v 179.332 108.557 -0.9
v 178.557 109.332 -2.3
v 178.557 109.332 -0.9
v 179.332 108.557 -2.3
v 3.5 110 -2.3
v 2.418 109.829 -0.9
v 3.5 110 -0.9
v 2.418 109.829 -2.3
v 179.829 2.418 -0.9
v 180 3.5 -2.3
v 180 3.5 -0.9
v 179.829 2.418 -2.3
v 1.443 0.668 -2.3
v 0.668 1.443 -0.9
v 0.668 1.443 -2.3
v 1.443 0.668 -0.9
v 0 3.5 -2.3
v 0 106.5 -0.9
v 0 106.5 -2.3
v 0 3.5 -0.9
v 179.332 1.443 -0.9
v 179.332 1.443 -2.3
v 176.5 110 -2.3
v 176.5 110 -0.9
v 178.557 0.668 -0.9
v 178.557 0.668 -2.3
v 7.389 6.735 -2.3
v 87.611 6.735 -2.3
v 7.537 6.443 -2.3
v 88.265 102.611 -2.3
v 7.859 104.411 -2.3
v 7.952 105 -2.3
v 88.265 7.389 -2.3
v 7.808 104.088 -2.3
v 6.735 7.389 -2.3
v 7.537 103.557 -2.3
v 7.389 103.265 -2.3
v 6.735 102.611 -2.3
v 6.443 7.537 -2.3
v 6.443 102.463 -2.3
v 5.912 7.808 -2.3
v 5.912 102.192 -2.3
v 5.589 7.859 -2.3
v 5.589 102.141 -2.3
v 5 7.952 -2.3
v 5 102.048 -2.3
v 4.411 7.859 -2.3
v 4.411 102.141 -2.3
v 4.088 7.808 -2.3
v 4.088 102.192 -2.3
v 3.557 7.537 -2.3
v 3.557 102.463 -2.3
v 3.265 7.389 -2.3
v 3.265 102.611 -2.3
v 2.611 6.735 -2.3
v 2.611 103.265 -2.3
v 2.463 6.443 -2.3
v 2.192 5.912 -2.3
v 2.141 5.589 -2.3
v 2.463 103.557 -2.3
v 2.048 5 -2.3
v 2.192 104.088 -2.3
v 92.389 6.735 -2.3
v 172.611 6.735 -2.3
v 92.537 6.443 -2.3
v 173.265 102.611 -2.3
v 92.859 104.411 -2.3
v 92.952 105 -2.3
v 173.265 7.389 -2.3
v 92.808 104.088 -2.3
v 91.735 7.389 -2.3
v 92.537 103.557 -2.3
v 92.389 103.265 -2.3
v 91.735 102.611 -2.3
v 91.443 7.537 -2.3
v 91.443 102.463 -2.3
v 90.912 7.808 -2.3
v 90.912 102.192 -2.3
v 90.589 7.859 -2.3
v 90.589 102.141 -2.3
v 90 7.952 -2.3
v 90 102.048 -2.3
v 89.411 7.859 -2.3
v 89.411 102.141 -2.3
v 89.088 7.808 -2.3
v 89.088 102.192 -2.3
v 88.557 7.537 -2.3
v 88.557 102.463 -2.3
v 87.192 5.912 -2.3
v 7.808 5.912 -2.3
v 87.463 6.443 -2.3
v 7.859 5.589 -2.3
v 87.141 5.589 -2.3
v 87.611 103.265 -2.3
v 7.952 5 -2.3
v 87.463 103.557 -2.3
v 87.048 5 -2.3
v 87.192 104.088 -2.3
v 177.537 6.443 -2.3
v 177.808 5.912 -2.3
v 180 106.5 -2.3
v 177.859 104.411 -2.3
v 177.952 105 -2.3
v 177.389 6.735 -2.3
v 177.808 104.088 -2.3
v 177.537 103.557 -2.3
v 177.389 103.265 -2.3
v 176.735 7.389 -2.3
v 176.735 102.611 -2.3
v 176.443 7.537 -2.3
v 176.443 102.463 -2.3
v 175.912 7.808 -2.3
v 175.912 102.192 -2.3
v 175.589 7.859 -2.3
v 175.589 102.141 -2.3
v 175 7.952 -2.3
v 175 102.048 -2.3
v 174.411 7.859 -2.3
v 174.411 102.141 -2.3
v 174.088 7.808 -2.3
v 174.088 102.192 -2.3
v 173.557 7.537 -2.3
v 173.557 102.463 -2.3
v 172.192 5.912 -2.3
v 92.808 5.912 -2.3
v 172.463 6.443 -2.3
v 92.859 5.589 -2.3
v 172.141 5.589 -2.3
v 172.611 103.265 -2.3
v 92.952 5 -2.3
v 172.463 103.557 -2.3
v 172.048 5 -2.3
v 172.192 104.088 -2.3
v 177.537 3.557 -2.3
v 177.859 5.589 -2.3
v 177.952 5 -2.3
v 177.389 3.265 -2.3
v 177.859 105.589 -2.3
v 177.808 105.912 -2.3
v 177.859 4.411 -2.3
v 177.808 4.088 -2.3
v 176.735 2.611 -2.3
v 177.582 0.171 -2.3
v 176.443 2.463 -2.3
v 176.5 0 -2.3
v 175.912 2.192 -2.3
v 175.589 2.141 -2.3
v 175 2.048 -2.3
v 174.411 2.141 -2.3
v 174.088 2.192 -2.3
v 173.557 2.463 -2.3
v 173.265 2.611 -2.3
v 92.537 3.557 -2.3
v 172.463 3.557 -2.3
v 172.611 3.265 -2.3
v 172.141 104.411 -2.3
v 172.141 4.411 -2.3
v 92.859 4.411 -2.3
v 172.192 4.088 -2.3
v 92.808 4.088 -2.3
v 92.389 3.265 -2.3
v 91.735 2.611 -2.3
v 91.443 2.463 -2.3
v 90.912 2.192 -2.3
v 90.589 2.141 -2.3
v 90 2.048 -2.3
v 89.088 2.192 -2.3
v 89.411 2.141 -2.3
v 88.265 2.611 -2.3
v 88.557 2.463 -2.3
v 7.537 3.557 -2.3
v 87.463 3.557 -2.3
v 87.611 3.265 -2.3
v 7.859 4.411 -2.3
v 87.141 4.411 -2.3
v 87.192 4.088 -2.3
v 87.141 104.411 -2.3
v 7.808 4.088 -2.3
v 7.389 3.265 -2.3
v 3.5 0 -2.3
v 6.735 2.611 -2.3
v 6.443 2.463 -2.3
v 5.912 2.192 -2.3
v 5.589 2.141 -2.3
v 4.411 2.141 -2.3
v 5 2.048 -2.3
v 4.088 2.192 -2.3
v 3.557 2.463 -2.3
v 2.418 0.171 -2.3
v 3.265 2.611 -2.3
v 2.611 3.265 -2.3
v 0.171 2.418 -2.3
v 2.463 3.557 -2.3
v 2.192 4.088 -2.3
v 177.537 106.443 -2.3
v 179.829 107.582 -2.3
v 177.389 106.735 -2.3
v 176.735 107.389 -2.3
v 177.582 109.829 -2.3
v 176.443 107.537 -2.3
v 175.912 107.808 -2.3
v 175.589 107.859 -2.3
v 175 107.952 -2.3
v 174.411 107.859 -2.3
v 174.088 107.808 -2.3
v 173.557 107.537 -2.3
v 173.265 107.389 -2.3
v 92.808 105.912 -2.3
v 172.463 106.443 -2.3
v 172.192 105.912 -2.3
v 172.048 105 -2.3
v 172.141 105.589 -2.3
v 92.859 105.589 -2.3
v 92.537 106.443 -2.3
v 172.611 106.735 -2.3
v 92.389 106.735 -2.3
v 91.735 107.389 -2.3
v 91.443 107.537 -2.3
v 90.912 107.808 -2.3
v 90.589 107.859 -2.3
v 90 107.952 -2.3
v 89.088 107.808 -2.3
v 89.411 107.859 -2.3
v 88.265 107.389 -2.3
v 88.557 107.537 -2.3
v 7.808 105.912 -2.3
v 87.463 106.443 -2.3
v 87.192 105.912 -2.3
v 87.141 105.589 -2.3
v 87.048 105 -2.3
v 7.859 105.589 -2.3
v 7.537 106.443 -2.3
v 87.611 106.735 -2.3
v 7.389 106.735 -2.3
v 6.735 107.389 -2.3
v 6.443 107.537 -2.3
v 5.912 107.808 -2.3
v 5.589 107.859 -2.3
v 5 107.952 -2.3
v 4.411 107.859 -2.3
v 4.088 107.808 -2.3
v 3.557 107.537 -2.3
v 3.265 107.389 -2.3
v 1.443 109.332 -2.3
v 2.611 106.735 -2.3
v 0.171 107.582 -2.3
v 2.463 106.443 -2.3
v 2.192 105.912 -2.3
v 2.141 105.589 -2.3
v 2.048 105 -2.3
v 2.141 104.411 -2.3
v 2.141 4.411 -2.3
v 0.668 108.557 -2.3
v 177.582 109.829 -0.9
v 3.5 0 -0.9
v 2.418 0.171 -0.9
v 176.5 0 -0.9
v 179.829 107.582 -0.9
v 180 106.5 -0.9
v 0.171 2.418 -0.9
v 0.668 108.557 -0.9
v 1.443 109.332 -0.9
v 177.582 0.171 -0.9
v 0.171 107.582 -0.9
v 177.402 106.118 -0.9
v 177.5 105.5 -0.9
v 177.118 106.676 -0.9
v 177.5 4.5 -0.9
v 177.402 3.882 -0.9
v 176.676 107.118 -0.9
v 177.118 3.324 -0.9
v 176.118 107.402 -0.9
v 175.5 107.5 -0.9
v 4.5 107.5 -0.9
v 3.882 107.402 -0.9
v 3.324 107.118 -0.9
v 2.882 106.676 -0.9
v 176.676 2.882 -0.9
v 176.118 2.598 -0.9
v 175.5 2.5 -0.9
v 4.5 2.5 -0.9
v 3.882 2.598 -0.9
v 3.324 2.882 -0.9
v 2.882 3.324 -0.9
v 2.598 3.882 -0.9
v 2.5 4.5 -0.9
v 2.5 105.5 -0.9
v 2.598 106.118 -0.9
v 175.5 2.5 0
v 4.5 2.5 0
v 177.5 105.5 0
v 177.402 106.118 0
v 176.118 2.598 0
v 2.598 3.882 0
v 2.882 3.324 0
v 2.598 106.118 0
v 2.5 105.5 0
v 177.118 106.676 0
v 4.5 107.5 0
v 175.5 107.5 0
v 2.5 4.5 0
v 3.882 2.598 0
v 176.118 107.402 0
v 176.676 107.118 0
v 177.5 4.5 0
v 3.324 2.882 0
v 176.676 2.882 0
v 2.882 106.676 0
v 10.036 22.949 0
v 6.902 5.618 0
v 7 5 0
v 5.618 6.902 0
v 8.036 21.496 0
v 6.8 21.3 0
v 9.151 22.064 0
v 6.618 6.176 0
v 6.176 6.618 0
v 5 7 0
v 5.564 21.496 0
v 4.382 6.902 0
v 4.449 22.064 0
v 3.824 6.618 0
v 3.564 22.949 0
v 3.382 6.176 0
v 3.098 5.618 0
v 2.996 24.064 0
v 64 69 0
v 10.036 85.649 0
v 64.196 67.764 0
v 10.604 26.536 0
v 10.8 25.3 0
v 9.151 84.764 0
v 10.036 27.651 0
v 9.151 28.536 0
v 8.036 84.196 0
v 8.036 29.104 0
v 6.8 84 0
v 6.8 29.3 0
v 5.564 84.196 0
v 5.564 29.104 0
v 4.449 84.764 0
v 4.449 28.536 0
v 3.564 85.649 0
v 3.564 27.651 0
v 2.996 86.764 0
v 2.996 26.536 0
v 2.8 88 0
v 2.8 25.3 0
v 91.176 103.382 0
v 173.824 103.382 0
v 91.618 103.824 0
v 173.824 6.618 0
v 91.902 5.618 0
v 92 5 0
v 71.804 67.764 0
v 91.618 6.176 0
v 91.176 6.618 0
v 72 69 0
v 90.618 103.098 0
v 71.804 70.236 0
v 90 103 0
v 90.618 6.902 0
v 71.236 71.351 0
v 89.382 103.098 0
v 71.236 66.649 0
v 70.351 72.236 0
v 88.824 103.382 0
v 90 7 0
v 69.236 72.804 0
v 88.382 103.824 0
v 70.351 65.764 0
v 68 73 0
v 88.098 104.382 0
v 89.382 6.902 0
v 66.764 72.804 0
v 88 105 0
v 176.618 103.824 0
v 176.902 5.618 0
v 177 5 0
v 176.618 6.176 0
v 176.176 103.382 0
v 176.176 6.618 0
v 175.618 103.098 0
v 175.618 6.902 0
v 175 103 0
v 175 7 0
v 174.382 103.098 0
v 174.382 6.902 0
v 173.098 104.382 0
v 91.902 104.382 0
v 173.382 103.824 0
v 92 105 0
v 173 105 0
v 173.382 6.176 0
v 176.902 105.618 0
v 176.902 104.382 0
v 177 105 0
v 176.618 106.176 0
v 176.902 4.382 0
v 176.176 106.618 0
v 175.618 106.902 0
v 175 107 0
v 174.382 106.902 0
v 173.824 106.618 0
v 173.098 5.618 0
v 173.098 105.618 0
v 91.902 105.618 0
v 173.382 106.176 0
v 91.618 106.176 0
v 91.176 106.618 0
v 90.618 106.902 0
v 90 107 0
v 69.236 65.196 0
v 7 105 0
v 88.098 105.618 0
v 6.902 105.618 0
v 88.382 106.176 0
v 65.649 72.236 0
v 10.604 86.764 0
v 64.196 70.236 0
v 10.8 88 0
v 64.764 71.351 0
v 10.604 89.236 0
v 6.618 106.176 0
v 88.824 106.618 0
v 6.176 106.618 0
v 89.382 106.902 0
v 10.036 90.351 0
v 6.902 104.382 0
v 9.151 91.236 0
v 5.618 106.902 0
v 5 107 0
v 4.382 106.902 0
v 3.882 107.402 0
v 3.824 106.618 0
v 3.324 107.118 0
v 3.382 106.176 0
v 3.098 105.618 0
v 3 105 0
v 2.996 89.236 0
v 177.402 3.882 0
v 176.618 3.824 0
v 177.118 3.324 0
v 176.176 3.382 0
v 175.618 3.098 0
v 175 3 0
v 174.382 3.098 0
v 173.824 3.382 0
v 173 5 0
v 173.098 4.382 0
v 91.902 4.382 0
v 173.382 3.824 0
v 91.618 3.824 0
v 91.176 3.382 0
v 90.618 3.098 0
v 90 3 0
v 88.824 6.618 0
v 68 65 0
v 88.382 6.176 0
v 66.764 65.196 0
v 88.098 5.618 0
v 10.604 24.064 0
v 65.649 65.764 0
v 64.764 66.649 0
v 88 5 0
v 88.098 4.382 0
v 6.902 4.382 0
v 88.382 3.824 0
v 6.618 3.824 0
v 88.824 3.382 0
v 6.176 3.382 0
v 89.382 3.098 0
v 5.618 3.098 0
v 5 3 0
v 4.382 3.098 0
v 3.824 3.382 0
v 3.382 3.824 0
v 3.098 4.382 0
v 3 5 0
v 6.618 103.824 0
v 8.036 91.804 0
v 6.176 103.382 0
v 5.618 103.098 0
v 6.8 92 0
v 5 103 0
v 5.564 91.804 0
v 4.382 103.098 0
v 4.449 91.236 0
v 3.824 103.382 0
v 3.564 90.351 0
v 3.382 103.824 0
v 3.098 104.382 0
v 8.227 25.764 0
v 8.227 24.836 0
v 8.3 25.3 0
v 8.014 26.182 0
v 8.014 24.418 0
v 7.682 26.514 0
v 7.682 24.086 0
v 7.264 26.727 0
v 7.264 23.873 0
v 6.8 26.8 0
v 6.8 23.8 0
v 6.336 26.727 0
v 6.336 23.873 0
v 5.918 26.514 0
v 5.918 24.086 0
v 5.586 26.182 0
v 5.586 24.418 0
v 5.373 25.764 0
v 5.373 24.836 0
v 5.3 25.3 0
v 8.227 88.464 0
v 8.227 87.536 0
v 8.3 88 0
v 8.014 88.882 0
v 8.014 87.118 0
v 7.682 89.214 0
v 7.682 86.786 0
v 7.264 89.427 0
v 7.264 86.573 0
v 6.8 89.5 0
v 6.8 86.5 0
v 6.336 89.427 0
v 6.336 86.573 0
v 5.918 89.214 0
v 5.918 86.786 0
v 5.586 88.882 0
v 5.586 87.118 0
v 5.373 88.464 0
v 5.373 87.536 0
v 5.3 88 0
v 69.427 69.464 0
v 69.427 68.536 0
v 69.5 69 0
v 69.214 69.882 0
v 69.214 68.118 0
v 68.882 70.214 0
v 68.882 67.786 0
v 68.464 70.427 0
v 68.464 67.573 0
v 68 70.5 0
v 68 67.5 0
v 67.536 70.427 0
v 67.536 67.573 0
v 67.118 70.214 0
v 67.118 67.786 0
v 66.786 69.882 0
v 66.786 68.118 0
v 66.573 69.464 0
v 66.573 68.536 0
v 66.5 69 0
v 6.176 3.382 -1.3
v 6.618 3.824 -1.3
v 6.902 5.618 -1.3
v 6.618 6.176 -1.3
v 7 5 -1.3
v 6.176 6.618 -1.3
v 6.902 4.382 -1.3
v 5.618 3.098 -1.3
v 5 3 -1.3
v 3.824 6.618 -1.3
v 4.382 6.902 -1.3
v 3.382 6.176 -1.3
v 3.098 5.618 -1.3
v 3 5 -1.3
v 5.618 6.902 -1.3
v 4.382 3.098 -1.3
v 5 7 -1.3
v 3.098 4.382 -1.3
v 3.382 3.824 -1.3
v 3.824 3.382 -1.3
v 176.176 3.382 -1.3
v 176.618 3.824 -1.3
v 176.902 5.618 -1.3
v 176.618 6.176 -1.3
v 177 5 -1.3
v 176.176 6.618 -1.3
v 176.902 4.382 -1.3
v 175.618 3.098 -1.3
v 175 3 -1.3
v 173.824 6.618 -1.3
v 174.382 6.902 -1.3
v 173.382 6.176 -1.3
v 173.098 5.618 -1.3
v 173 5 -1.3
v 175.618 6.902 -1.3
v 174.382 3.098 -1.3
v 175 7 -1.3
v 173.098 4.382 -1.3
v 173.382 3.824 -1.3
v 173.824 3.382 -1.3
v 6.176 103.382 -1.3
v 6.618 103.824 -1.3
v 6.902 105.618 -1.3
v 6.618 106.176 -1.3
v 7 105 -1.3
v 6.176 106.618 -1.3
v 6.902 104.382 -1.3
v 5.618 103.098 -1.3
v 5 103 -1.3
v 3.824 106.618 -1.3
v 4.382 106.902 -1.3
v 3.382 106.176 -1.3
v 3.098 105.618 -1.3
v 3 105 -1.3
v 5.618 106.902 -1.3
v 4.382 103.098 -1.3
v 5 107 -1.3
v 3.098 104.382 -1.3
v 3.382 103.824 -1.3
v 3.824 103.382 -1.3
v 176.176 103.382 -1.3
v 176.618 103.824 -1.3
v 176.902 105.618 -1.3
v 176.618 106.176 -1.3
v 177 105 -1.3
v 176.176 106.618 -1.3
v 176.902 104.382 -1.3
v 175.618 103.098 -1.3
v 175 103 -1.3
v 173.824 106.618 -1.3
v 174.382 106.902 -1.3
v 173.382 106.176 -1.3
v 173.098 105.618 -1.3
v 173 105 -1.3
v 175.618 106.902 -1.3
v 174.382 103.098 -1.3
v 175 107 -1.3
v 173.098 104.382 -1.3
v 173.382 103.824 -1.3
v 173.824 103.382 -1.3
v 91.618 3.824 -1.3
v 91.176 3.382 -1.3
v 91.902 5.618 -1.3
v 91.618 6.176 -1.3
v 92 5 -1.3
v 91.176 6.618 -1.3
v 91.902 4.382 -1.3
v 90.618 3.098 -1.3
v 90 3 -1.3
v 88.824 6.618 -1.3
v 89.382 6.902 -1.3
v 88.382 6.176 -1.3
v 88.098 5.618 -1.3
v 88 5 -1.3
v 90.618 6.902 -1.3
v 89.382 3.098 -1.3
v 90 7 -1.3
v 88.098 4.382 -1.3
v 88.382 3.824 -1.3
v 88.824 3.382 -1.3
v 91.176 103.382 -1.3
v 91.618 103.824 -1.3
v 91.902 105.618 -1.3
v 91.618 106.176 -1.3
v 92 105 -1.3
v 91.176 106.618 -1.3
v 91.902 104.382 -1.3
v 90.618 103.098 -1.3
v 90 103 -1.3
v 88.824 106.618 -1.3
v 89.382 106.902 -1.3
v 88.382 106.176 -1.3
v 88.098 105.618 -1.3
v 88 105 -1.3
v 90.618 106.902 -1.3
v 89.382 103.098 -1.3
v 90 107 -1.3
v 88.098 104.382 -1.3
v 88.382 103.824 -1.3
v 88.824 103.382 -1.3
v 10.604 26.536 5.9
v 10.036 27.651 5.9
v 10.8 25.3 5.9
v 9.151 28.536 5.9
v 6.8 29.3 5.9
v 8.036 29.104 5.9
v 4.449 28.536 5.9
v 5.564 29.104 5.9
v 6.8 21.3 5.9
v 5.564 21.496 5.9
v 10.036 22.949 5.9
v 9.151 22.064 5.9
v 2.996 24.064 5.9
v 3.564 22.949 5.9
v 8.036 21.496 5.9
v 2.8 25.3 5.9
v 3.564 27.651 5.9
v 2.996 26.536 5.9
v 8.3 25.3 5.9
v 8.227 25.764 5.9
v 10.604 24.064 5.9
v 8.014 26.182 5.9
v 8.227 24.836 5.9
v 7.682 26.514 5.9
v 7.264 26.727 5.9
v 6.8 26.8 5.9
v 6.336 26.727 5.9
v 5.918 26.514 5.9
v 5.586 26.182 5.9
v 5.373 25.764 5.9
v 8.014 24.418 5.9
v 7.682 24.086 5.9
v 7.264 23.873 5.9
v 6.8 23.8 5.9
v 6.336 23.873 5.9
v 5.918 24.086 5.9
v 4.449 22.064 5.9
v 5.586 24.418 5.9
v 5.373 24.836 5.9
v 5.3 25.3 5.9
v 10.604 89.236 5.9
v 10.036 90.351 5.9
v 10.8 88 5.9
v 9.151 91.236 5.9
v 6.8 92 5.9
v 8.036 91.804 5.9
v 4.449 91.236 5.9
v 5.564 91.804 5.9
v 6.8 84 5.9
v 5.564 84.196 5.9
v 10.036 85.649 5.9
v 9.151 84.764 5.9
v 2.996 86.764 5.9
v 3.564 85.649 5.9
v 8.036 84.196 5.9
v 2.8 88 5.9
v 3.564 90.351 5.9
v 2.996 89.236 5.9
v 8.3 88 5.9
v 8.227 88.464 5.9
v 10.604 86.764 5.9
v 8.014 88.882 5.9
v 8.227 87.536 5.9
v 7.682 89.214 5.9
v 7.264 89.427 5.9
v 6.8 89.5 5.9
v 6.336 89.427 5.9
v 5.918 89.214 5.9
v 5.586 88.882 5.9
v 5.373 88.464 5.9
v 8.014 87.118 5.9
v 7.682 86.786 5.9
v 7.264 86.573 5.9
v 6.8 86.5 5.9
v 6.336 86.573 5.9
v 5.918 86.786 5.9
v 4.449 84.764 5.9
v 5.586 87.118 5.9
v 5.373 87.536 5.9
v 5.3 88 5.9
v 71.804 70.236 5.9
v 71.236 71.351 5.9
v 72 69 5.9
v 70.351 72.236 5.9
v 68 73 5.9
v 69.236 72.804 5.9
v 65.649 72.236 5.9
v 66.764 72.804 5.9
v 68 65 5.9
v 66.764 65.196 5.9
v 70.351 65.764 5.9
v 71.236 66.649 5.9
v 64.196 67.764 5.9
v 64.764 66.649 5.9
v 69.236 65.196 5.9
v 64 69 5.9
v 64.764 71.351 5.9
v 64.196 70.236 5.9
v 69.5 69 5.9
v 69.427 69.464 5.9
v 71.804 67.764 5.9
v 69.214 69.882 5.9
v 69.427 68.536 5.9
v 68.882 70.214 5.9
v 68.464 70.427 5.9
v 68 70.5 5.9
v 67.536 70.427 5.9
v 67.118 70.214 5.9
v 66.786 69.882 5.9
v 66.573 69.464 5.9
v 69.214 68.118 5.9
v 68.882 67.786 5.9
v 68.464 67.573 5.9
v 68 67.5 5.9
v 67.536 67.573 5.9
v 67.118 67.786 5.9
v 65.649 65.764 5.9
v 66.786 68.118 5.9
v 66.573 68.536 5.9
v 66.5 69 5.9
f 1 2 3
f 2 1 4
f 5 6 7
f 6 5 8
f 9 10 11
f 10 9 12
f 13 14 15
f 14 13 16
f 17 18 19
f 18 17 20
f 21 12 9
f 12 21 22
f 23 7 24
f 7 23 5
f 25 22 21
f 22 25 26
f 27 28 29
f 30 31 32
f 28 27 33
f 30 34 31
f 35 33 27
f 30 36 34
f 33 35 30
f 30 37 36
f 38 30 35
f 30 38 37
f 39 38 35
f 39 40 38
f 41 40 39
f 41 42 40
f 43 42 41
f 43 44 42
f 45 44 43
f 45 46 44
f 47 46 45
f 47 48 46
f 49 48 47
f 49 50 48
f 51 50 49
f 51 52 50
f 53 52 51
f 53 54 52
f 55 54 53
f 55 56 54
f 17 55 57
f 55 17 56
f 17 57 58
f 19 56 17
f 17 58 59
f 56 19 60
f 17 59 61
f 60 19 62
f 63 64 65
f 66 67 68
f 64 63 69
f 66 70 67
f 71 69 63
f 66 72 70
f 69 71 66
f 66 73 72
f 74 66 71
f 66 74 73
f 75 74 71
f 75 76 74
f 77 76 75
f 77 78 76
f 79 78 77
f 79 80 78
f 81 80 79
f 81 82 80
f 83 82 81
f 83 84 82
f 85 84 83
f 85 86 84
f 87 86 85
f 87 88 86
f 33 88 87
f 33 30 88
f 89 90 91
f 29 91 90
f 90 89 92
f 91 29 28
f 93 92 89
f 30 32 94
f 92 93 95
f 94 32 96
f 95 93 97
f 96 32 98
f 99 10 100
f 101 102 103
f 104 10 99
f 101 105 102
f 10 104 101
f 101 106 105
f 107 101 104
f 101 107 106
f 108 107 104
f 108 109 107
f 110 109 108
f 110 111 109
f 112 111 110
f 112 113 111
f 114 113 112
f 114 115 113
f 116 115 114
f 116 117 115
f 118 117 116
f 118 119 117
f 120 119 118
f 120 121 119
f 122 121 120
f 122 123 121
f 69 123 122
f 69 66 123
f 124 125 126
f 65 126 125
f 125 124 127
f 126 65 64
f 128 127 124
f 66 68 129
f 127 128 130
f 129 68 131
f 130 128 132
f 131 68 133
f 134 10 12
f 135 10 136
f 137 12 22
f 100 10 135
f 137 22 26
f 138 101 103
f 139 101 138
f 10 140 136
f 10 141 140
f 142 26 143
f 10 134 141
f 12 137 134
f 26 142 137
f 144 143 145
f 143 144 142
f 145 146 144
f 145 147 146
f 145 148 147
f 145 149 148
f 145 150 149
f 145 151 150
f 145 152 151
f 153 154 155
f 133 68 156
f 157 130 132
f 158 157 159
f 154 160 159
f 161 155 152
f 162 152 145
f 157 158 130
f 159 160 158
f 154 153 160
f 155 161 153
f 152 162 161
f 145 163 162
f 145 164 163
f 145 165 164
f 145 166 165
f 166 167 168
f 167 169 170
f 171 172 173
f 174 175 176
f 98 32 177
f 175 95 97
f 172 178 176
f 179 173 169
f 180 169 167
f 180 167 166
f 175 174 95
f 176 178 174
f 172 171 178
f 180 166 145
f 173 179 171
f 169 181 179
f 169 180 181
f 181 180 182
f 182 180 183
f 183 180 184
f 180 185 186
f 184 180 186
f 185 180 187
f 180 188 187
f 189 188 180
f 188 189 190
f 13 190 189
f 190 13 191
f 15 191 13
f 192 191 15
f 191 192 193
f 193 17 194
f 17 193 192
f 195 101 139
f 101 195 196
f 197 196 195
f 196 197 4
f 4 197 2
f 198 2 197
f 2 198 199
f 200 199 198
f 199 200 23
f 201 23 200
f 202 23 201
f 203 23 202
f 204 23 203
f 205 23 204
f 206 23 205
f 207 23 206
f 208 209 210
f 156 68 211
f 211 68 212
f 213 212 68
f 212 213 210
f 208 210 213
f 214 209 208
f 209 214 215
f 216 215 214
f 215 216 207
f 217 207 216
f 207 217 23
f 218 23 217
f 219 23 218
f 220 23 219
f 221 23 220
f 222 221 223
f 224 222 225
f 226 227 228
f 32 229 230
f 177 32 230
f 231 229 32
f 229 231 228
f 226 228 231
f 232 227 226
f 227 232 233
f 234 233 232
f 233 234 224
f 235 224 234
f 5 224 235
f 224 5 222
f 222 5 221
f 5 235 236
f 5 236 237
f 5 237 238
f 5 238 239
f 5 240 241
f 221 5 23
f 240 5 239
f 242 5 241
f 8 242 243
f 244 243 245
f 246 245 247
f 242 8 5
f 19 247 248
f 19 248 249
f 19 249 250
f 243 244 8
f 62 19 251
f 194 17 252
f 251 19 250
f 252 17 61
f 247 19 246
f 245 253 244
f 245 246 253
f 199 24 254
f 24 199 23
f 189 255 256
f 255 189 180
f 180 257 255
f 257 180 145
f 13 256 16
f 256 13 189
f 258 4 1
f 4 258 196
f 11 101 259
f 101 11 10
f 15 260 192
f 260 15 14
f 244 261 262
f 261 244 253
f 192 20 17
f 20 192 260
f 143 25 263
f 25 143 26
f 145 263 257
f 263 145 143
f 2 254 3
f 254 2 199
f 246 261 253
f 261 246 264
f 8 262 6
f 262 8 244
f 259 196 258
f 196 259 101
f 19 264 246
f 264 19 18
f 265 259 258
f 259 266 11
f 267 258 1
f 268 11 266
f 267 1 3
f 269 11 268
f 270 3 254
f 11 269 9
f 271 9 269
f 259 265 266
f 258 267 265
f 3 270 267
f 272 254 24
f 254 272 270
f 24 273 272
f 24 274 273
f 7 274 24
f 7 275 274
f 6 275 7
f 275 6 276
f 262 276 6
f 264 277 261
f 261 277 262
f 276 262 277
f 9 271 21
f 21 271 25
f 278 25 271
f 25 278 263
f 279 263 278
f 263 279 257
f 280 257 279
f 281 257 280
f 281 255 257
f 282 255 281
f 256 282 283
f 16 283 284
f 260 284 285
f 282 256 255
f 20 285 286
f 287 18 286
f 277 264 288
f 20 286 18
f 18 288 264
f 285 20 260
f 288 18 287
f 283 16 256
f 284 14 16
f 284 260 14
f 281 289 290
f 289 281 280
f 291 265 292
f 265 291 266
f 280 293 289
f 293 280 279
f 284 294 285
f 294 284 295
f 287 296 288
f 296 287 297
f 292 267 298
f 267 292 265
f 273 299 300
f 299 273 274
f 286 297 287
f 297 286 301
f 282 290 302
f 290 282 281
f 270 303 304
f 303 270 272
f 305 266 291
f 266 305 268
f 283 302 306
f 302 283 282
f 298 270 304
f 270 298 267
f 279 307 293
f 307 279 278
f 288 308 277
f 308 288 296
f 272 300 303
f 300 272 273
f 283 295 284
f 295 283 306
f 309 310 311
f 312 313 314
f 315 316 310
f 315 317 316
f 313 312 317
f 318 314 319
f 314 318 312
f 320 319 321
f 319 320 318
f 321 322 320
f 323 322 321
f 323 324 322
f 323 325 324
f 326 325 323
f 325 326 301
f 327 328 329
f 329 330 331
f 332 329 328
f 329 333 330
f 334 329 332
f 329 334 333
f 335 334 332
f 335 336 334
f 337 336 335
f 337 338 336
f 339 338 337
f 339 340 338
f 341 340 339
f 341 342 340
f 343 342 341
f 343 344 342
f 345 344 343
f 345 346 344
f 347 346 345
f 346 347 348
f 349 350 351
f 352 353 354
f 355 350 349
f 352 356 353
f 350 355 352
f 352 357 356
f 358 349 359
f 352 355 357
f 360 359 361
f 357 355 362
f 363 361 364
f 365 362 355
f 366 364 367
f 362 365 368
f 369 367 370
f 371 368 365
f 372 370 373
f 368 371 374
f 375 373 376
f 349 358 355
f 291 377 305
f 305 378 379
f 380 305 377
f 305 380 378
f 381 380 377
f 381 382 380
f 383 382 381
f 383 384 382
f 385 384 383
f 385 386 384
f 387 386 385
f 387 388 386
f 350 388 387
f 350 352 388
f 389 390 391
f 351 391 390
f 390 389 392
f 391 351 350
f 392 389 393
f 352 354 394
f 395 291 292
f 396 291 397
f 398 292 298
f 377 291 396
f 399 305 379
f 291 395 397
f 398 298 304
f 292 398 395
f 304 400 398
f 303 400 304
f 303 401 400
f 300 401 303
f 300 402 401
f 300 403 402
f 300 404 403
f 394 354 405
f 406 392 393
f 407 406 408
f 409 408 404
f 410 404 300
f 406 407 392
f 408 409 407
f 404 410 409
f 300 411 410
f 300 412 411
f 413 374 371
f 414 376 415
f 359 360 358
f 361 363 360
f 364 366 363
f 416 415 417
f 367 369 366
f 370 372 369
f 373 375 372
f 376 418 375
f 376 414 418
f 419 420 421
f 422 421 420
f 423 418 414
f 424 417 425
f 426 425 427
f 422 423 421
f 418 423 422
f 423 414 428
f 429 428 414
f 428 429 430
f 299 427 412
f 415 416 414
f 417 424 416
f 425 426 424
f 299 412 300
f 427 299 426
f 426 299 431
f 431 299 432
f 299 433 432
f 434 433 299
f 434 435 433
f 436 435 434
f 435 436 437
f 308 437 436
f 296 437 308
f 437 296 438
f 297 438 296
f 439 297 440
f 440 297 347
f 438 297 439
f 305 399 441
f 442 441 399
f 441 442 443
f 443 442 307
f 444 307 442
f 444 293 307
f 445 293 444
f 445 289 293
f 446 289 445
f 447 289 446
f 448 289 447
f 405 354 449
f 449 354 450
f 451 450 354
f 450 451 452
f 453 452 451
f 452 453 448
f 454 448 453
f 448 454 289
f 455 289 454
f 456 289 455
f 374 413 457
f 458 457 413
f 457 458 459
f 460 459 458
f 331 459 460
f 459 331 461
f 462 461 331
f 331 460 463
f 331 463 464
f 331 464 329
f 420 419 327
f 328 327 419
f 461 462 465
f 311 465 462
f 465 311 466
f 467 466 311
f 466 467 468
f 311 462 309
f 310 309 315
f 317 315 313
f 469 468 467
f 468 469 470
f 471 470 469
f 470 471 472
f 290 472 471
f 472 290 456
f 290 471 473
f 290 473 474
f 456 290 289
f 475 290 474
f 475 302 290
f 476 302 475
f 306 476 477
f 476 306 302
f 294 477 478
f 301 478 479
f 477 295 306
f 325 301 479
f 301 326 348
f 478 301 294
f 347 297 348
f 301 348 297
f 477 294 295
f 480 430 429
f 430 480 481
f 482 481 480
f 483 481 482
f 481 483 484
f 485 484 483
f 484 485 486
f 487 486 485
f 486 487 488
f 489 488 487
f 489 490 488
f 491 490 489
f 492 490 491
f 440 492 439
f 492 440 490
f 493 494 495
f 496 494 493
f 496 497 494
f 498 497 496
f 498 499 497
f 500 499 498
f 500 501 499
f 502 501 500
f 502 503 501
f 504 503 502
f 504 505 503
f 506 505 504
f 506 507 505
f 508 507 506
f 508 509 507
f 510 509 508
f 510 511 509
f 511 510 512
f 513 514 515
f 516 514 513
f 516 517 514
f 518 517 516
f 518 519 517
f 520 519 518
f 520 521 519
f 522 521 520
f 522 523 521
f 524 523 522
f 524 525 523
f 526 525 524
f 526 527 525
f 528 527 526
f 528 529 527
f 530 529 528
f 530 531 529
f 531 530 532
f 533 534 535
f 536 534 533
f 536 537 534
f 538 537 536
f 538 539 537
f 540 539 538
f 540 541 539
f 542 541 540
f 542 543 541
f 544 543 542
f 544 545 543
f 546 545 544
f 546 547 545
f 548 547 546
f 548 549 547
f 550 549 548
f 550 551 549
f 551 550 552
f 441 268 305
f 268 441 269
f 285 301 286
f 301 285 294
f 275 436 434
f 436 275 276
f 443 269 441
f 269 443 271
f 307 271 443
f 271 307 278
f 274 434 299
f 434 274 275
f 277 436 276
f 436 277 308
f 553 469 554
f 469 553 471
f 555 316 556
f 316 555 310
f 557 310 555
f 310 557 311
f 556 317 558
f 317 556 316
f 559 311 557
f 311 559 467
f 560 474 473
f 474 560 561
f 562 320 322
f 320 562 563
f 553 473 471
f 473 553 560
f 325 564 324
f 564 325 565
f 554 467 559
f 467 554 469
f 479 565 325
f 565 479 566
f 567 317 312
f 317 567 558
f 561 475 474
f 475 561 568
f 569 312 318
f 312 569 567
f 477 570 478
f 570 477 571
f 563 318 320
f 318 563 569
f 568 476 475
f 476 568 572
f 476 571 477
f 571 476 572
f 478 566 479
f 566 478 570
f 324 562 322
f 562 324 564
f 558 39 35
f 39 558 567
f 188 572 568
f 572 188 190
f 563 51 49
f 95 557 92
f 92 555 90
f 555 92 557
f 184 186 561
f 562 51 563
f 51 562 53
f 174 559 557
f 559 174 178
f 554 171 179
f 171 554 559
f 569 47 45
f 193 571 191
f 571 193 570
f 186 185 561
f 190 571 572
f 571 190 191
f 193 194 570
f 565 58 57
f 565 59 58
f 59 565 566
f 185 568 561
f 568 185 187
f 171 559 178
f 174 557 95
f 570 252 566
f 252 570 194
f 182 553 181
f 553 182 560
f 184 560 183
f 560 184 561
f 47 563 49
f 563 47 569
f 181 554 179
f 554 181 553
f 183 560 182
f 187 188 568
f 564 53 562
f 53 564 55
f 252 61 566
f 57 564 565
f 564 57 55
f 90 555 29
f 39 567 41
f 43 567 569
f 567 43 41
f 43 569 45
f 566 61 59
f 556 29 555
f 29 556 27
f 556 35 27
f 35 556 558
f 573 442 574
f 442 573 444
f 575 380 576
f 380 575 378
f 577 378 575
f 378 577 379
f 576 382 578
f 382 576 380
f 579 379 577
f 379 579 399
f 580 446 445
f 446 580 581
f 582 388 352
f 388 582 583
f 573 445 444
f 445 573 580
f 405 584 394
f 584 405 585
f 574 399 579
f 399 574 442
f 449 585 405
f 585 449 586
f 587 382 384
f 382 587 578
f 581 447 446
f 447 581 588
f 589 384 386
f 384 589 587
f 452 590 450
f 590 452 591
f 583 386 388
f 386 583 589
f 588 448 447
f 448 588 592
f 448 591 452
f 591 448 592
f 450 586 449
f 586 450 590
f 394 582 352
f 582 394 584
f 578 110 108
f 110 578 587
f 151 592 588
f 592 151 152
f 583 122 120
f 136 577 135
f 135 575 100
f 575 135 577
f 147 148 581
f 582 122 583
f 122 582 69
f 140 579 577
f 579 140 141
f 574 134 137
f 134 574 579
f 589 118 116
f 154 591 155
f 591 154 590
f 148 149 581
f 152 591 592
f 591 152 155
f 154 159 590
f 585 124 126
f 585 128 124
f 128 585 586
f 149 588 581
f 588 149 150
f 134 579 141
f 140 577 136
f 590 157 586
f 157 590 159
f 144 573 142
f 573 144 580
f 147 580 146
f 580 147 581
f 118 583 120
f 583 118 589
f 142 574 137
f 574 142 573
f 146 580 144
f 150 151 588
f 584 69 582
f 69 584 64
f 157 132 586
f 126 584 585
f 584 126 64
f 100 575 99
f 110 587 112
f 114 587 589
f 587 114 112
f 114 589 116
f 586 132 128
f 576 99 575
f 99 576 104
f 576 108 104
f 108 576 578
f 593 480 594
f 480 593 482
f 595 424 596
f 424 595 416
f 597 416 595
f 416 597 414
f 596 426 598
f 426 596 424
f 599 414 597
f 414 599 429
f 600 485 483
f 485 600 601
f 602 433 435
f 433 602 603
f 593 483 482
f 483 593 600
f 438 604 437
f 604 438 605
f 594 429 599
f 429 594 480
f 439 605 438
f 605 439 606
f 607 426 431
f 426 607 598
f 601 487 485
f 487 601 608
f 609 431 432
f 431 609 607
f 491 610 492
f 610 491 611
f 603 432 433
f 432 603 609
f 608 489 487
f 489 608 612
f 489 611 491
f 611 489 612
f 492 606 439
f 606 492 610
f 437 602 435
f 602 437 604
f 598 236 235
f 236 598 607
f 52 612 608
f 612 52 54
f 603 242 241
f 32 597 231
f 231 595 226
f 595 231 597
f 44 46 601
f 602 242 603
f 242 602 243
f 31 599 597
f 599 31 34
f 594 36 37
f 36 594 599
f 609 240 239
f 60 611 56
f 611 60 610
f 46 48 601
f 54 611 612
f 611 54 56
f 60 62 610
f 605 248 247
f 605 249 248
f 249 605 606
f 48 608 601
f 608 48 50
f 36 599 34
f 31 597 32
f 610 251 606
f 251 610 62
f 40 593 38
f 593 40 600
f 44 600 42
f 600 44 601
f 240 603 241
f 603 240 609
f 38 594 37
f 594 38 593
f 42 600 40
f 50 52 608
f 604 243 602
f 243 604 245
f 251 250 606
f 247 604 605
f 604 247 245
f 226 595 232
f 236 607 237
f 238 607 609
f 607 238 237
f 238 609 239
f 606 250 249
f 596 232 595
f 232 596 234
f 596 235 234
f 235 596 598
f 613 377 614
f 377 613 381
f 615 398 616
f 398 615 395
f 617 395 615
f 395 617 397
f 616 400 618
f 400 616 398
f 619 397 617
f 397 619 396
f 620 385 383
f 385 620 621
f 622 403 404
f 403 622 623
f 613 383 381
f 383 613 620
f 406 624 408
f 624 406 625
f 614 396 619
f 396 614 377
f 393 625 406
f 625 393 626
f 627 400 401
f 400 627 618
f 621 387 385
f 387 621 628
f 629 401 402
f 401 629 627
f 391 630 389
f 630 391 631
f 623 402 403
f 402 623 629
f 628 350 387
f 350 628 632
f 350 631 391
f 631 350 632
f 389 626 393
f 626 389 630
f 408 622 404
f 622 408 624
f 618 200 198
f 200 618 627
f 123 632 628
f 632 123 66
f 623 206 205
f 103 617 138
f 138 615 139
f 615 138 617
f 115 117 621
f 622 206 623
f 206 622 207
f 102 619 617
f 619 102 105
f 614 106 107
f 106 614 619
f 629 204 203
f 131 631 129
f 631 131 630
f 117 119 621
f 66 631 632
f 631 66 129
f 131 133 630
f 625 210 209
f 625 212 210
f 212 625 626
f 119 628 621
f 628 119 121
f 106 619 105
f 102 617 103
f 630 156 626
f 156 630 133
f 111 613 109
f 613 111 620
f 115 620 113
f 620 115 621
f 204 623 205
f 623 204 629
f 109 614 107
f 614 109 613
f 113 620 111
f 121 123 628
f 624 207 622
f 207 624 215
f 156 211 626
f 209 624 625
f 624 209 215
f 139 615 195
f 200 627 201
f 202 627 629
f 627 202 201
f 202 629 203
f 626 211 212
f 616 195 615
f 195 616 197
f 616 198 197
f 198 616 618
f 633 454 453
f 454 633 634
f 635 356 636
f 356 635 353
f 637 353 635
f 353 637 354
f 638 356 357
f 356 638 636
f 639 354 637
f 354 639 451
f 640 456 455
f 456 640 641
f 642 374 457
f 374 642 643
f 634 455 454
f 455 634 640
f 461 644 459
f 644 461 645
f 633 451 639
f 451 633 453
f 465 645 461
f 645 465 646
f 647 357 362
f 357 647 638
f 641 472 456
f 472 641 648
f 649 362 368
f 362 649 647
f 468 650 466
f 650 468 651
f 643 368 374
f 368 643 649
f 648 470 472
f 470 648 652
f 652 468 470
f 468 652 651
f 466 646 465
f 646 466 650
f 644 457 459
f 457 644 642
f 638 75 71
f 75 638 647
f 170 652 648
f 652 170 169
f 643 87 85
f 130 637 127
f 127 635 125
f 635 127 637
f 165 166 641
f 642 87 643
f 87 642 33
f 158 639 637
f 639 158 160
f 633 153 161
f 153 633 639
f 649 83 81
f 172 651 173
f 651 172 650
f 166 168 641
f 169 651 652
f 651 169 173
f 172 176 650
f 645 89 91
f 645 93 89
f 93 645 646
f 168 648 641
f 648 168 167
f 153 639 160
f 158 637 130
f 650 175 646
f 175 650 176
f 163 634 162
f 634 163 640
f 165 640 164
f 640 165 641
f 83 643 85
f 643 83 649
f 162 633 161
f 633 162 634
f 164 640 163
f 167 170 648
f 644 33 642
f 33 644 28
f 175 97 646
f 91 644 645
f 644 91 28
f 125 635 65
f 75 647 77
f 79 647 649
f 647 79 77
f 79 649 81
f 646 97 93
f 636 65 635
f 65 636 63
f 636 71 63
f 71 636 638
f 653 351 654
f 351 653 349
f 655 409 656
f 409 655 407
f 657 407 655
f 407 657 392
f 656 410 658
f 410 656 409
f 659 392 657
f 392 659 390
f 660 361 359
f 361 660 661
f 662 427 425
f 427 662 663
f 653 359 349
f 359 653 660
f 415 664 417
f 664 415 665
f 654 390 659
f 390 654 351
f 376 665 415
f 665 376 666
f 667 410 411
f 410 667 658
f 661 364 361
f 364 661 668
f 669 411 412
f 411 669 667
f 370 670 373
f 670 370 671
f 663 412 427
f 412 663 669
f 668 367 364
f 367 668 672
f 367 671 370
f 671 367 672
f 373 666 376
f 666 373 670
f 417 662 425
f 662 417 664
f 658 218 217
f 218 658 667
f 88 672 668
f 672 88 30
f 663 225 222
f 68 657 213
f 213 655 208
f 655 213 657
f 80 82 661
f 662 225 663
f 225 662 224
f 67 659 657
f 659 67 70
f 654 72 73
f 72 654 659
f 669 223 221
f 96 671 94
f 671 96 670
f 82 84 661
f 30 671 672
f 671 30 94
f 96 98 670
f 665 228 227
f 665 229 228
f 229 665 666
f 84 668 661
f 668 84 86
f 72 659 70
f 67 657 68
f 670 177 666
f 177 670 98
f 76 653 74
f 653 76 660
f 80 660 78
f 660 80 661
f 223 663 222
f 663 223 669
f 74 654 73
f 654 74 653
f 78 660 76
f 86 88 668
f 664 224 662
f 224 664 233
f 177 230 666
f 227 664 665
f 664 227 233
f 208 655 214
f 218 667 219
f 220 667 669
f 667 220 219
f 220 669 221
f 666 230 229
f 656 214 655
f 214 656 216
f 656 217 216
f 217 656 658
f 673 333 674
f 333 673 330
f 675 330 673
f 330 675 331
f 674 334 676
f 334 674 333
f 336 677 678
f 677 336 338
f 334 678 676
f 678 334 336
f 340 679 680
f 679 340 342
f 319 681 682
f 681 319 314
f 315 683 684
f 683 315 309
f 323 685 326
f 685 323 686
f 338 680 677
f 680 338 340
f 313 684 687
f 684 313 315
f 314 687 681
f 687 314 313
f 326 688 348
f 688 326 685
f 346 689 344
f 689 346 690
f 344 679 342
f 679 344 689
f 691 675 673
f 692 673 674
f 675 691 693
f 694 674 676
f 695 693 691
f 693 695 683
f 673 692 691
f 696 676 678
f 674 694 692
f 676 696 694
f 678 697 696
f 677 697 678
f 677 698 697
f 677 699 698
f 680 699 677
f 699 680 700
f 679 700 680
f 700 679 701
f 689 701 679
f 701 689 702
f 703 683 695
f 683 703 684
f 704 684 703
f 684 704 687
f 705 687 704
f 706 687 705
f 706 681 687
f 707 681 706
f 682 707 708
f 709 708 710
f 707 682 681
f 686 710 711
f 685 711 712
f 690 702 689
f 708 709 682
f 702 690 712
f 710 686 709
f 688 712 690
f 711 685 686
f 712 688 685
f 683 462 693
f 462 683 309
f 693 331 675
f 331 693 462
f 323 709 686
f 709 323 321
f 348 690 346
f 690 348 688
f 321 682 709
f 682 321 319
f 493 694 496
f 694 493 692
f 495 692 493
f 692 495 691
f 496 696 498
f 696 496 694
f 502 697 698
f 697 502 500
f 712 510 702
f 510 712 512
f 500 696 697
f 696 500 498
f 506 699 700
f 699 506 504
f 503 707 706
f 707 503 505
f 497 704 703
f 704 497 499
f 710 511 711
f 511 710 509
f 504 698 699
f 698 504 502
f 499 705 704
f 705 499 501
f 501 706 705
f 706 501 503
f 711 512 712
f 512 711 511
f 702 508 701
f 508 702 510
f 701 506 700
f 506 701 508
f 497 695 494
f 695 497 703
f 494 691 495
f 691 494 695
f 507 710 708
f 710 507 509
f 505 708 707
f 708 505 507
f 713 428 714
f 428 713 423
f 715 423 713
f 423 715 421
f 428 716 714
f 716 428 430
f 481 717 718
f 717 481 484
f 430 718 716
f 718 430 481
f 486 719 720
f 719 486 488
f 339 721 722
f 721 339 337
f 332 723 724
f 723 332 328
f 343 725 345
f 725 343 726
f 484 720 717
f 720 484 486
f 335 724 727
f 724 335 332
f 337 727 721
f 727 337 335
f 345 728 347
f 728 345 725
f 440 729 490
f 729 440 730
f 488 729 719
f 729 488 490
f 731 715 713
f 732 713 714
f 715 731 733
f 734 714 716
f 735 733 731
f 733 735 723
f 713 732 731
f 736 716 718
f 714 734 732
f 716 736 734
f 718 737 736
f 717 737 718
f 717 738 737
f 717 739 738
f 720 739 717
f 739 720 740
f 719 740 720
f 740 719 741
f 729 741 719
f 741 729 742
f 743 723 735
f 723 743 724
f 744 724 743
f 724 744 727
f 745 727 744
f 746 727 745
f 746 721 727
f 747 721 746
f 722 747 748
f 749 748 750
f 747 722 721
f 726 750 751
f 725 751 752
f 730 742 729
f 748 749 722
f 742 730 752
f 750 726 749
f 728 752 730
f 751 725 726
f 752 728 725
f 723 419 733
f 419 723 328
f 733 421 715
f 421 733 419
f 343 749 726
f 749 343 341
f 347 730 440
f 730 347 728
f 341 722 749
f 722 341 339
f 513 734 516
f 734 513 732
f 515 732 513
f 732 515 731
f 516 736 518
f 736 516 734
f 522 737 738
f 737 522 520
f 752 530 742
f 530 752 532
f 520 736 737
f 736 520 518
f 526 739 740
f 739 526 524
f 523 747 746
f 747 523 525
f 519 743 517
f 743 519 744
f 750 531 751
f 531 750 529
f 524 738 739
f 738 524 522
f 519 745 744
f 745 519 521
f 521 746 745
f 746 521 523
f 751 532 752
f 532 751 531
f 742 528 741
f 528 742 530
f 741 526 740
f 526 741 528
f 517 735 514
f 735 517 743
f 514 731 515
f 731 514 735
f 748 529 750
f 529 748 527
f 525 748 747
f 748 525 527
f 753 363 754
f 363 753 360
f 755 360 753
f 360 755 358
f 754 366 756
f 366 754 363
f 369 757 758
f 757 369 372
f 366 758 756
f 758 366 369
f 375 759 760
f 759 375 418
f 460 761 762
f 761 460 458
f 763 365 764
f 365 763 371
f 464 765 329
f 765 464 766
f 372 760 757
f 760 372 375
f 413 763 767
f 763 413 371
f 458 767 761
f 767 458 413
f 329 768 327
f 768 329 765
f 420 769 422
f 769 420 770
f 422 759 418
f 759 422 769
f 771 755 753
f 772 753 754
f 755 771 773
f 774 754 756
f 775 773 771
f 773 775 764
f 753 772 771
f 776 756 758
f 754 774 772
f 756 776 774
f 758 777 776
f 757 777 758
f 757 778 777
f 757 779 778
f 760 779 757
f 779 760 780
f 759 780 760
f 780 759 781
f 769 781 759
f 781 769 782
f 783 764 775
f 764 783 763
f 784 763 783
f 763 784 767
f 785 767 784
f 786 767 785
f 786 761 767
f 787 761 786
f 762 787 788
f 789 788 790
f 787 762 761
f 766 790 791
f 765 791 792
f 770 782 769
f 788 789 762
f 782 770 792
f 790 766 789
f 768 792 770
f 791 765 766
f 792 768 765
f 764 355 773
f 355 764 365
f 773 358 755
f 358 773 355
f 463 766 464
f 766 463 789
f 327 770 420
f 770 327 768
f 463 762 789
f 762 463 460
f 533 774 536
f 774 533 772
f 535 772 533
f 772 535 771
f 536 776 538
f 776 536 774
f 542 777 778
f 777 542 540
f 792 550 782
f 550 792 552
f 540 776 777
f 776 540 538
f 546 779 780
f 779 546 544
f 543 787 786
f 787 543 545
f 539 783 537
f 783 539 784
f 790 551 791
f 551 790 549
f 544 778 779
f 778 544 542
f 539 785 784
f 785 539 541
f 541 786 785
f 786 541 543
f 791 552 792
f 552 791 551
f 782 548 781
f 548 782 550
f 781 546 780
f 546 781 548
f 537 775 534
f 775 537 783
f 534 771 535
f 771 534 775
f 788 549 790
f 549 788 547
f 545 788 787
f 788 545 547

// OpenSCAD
/*
multiple footswitches, newer version than 'multi-footswitchx'
 
4x2

print with PLA to prevent warping

custom own pcb.
*/

$fn=20;


WALL_THICKNESS = 2;
FRONT_THICKNESS = 3;

BACK_THICKNESS = 1.3;
BACK_THICKNESS_OUTER = 1.0;  // minimum 1

MOUNT_X = 5;
MOUNT_Y = 5;
MOUNT_R_OUTER = 4;
MOUNT_R_INNER = 1.5;

FOOTSWITCH_HOLE_R = 6.25;
FOOTSWITCH_NUM_X = 4;
FOOTSWITCH_NUM_Y = 2;
FOOTSWITCH_SPACING_X = 50;
FOOTSWITCH_SPACING_Y = 80;
FOOTSWITCH_OFFSET_X = 15;
FOOTSWITCH_OFFSET_Y = 15;

WIDTH = 2*FOOTSWITCH_OFFSET_X + (FOOTSWITCH_NUM_X-1)*FOOTSWITCH_SPACING_X;  //180;
HEIGHT = 2*FOOTSWITCH_OFFSET_Y + (FOOTSWITCH_NUM_Y-1)*FOOTSWITCH_SPACING_Y;  // actually depth in our context
DEPTH = 32;  // actually height in our context
ROUNDING_R = 3.5;

PSU_R = 4.1;  // a separate PSU plug
JACK_R = 5.8;

echo("WIDTH:", WIDTH);

// back

//BACK_DEPTH = 3;

module rounded_cube(x, y, z, r) {
	translate([r, r, 0])
	minkowski() {
		cylinder(r=r, h=1);
		cube([x - 2*r, y - 2*r, z-1]);
	}
}



module tapped_hole(r1, r2, h1, h2, h3=5) {
   // make some kind of a funnell
	// for use with screws
	// it is on purpose a little bit bigger than advertised. it is used for subtraction

	translate([0, 0, -1])
	cylinder(r=r1, h=h1+2);
	translate([0, 0, h1])
	cylinder(r1=r1, r2=r2, h=h2+0.1);
	translate([0, 0, h1+h2])
	cylinder(r=r2, h=h3+0.1);
}

module mount_tube(x, y, h1, h2) {
	difference() {
		translate([x, y, h1-0.5])
		cylinder(r=MOUNT_R_OUTER, h=h2-1);

		translate([x, y, h1-1])
		cylinder(r=MOUNT_R_INNER, h=h2);
	}

}

module midi_hole() {
	translate([0,0,-1])
	cylinder(r=8, h=10, $fn=20);
	translate([11.25,0,-1])
	cylinder(r=1.7, h=10, $fn=20);
	translate([-11.25,0,-1])
	cylinder(r=1.7, h=10, $fn=20);
}

module psu_hole() {
	// psu hole
	translate([0,0,-0.1])
	//rotate([-90,0,0])
	//translate([0,0,-0.1])
	cylinder(r=PSU_R, h=10);
}

module jack_hole() {
	// expression pedal
	translate([0,0,-0.1])
	#cylinder(r=JACK_R, h=32);
}

module footswitch_hole() {
	translate([0,0,-0.1])
	#cylinder(r=FOOTSWITCH_HOLE_R, h=22);
	*translate([-6,-11,10])
	#cube([12,30,15]);
}

module mounting_tube(r1=3, r2=1, h=10) {
	difference() {
		cylinder(r=r1, h=h);
		translate([0,0,-0.1])
		cylinder(r=r2, h=h+0.2);
	}
}

module arduino_approx() {
	#cube([67, 53, 20]);
}

module arduino_mount(r1, r2, h) {
	translate([2.5, 18, 0])
	mounting_tube(r1=r1, r2=r2, h=h);

	translate([2.5, 46, 0])
	mounting_tube(r1=r1, r2=r2, h=h);

	translate([53, 3, 0])
	mounting_tube(r1=r1, r2=r2, h=h);

	translate([55, 50, 0])
	mounting_tube(r1=r1, r2=r2, h=h);
}

module pcb_mock() {
    #cube([68,68,22]);

    translate([-10,5.5+10.5,12])
    rotate([0,90,0])
    #cylinder(r=9, h=25);

    translate([-10,29.5+10.5,12])
    rotate([0,90,0])
    #cylinder(r=9, h=25);
    
    translate([-10,53,2])
    #cube([25,10,12]);
}
// the pcb is 68x68mm
module pcb_mount(r1, r2, h) {
    translate([3.3, 3.3, 0])
	mounting_tube(r1=r1, r2=r2, h=h);

	translate([3.3, 66, 0])
	mounting_tube(r1=r1, r2=r2, h=h);

	translate([64.5, 47, 0])
	mounting_tube(r1=r1, r2=r2, h=h);
    
}

module led8_holes() {
	for (i=[0:7]) {
		translate([i*6.7,0,-0.1])
		cylinder(r=2.5, h=10);
	}

	translate([13.5-3.5,-4.1,0.3])
	cylinder(r=1.25,h=10);
	translate([40.5-3.5,-4.1,0.3])
	cylinder(r=1.25,h=10);
}

module led8_mount(r1, r2, h) {
	translate([13.5-3.5,-4.1,0])
	mounting_tube(r1=r1,r2=r2,h=h);
	translate([40.5-3.5,-4.1,0])
	mounting_tube(r1=r1,r2=r2,h=h);
}

module base() {
union() {
	difference() {
		rounded_cube(WIDTH, HEIGHT, DEPTH, ROUNDING_R);

		translate([WALL_THICKNESS, WALL_THICKNESS, FRONT_THICKNESS])
		rounded_cube(
			WIDTH-2*WALL_THICKNESS, HEIGHT-2*WALL_THICKNESS, 
			DEPTH, ROUNDING_R-WALL_THICKNESS);

		for (y=[0:FOOTSWITCH_NUM_Y-1]) {
		for (x=[0:FOOTSWITCH_NUM_X-1]) {
			translate([FOOTSWITCH_OFFSET_X+x*FOOTSWITCH_SPACING_X, FOOTSWITCH_OFFSET_Y+y*FOOTSWITCH_SPACING_Y, -1])
			footswitch_hole();
		}
		}

		*translate([0, 40, 14])
		rotate([90,0,0])
		rotate([0,90,0])
		#midi_hole();

		*translate([0, 40+30, 14])
		rotate([90,0,0])
		rotate([0,90,0])
		#midi_hole();

		*translate([WIDTH/2, HEIGHT, 14])
		rotate([90,0,0])
		psu_hole();

		translate([WIDTH, 40, 14])
		rotate([0,-90,0])
		jack_hole();

		translate([WIDTH, 40+30, 14])
		rotate([0,-90,0])
		jack_hole();

		*translate([55, 28, 5])
		arduino_approx();

		translate([33, 73, 0])
		led8_holes();
	}

	mount_tube(MOUNT_X, MOUNT_Y, FRONT_THICKNESS, DEPTH-FRONT_THICKNESS);
	mount_tube(WIDTH-MOUNT_X, MOUNT_Y, FRONT_THICKNESS, DEPTH-FRONT_THICKNESS);
	mount_tube(MOUNT_X, HEIGHT-MOUNT_Y, FRONT_THICKNESS, DEPTH-FRONT_THICKNESS);
	mount_tube(WIDTH-MOUNT_X, HEIGHT-MOUNT_Y, FRONT_THICKNESS, DEPTH-FRONT_THICKNESS);
	mount_tube(WIDTH/2, MOUNT_Y, FRONT_THICKNESS, DEPTH-FRONT_THICKNESS);
	mount_tube(WIDTH/2, HEIGHT-MOUNT_Y, FRONT_THICKNESS, DEPTH-FRONT_THICKNESS);


	// stronger chassis
	translate([WIDTH/2-WALL_THICKNESS/2,1,1])
	cube([WALL_THICKNESS, HEIGHT-2, DEPTH-10]);

	*translate([135,1,1])
	cube([WALL_THICKNESS, HEIGHT-2, DEPTH-10]);

    translate([33, 73, 0.1])
    led8_mount(3, 1.25, 3.5);

}

}

module base_back() {
	difference() {
		union() {
			translate([0,0, BACK_THICKNESS_OUTER-0.1])
			rounded_cube(WIDTH, HEIGHT, BACK_THICKNESS+0.1, ROUNDING_R);

			translate([WALL_THICKNESS+0.5, WALL_THICKNESS+0.5, 0])
			rounded_cube(WIDTH-2*WALL_THICKNESS-2*0.5, HEIGHT-2*WALL_THICKNESS-2*0.5, BACK_THICKNESS_OUTER+0.1, 2);

		}

		translate([MOUNT_X, MOUNT_Y, 0])
		tapped_hole(r1=2, r2=4, h1=1+BACK_THICKNESS-BACK_THICKNESS_OUTER, h2=2);
		translate([WIDTH-MOUNT_X, MOUNT_Y, 0])
		tapped_hole(r1=2, r2=4, h1=1+BACK_THICKNESS-BACK_THICKNESS_OUTER, h2=2);
		translate([MOUNT_X, HEIGHT-MOUNT_Y, 0])
		tapped_hole(r1=2, r2=4, h1=1+BACK_THICKNESS-BACK_THICKNESS_OUTER, h2=2);
		translate([WIDTH-MOUNT_X, HEIGHT-MOUNT_Y, 0])
		tapped_hole(r1=2, r2=4, h1=1+BACK_THICKNESS-BACK_THICKNESS_OUTER, h2=2);

		translate([WIDTH/2, MOUNT_Y, 0])
		tapped_hole(r1=2, r2=4, h1=1+BACK_THICKNESS-BACK_THICKNESS_OUTER, h2=2);
		translate([WIDTH/2, HEIGHT-MOUNT_Y, 0])
		tapped_hole(r1=2, r2=4, h1=1+BACK_THICKNESS-BACK_THICKNESS_OUTER, h2=2);
	}
}

module back() {
mirror([0,0,1])
//rotate([180,0,0])
base_back();
translate([WALL_THICKNESS+1.5,22,-0.1])
pcb_mount(4, 1.5, 6);

*translate([WALL_THICKNESS+0.5,22,6])
pcb_mock();
}

*difference() {
base();
translate([0, HEIGHT, DEPTH-BACK_THICKNESS+BACK_THICKNESS_OUTER])
rotate([0,180,0])
rotate([0,0,180])
translate([WALL_THICKNESS+0.5,22,6])
pcb_mock();
}

//translate([0, HEIGHT, DEPTH-BACK_THICKNESS+BACK_THICKNESS_OUTER])
//rotate([0,180,0])
//rotate([0,0,180])
back();
